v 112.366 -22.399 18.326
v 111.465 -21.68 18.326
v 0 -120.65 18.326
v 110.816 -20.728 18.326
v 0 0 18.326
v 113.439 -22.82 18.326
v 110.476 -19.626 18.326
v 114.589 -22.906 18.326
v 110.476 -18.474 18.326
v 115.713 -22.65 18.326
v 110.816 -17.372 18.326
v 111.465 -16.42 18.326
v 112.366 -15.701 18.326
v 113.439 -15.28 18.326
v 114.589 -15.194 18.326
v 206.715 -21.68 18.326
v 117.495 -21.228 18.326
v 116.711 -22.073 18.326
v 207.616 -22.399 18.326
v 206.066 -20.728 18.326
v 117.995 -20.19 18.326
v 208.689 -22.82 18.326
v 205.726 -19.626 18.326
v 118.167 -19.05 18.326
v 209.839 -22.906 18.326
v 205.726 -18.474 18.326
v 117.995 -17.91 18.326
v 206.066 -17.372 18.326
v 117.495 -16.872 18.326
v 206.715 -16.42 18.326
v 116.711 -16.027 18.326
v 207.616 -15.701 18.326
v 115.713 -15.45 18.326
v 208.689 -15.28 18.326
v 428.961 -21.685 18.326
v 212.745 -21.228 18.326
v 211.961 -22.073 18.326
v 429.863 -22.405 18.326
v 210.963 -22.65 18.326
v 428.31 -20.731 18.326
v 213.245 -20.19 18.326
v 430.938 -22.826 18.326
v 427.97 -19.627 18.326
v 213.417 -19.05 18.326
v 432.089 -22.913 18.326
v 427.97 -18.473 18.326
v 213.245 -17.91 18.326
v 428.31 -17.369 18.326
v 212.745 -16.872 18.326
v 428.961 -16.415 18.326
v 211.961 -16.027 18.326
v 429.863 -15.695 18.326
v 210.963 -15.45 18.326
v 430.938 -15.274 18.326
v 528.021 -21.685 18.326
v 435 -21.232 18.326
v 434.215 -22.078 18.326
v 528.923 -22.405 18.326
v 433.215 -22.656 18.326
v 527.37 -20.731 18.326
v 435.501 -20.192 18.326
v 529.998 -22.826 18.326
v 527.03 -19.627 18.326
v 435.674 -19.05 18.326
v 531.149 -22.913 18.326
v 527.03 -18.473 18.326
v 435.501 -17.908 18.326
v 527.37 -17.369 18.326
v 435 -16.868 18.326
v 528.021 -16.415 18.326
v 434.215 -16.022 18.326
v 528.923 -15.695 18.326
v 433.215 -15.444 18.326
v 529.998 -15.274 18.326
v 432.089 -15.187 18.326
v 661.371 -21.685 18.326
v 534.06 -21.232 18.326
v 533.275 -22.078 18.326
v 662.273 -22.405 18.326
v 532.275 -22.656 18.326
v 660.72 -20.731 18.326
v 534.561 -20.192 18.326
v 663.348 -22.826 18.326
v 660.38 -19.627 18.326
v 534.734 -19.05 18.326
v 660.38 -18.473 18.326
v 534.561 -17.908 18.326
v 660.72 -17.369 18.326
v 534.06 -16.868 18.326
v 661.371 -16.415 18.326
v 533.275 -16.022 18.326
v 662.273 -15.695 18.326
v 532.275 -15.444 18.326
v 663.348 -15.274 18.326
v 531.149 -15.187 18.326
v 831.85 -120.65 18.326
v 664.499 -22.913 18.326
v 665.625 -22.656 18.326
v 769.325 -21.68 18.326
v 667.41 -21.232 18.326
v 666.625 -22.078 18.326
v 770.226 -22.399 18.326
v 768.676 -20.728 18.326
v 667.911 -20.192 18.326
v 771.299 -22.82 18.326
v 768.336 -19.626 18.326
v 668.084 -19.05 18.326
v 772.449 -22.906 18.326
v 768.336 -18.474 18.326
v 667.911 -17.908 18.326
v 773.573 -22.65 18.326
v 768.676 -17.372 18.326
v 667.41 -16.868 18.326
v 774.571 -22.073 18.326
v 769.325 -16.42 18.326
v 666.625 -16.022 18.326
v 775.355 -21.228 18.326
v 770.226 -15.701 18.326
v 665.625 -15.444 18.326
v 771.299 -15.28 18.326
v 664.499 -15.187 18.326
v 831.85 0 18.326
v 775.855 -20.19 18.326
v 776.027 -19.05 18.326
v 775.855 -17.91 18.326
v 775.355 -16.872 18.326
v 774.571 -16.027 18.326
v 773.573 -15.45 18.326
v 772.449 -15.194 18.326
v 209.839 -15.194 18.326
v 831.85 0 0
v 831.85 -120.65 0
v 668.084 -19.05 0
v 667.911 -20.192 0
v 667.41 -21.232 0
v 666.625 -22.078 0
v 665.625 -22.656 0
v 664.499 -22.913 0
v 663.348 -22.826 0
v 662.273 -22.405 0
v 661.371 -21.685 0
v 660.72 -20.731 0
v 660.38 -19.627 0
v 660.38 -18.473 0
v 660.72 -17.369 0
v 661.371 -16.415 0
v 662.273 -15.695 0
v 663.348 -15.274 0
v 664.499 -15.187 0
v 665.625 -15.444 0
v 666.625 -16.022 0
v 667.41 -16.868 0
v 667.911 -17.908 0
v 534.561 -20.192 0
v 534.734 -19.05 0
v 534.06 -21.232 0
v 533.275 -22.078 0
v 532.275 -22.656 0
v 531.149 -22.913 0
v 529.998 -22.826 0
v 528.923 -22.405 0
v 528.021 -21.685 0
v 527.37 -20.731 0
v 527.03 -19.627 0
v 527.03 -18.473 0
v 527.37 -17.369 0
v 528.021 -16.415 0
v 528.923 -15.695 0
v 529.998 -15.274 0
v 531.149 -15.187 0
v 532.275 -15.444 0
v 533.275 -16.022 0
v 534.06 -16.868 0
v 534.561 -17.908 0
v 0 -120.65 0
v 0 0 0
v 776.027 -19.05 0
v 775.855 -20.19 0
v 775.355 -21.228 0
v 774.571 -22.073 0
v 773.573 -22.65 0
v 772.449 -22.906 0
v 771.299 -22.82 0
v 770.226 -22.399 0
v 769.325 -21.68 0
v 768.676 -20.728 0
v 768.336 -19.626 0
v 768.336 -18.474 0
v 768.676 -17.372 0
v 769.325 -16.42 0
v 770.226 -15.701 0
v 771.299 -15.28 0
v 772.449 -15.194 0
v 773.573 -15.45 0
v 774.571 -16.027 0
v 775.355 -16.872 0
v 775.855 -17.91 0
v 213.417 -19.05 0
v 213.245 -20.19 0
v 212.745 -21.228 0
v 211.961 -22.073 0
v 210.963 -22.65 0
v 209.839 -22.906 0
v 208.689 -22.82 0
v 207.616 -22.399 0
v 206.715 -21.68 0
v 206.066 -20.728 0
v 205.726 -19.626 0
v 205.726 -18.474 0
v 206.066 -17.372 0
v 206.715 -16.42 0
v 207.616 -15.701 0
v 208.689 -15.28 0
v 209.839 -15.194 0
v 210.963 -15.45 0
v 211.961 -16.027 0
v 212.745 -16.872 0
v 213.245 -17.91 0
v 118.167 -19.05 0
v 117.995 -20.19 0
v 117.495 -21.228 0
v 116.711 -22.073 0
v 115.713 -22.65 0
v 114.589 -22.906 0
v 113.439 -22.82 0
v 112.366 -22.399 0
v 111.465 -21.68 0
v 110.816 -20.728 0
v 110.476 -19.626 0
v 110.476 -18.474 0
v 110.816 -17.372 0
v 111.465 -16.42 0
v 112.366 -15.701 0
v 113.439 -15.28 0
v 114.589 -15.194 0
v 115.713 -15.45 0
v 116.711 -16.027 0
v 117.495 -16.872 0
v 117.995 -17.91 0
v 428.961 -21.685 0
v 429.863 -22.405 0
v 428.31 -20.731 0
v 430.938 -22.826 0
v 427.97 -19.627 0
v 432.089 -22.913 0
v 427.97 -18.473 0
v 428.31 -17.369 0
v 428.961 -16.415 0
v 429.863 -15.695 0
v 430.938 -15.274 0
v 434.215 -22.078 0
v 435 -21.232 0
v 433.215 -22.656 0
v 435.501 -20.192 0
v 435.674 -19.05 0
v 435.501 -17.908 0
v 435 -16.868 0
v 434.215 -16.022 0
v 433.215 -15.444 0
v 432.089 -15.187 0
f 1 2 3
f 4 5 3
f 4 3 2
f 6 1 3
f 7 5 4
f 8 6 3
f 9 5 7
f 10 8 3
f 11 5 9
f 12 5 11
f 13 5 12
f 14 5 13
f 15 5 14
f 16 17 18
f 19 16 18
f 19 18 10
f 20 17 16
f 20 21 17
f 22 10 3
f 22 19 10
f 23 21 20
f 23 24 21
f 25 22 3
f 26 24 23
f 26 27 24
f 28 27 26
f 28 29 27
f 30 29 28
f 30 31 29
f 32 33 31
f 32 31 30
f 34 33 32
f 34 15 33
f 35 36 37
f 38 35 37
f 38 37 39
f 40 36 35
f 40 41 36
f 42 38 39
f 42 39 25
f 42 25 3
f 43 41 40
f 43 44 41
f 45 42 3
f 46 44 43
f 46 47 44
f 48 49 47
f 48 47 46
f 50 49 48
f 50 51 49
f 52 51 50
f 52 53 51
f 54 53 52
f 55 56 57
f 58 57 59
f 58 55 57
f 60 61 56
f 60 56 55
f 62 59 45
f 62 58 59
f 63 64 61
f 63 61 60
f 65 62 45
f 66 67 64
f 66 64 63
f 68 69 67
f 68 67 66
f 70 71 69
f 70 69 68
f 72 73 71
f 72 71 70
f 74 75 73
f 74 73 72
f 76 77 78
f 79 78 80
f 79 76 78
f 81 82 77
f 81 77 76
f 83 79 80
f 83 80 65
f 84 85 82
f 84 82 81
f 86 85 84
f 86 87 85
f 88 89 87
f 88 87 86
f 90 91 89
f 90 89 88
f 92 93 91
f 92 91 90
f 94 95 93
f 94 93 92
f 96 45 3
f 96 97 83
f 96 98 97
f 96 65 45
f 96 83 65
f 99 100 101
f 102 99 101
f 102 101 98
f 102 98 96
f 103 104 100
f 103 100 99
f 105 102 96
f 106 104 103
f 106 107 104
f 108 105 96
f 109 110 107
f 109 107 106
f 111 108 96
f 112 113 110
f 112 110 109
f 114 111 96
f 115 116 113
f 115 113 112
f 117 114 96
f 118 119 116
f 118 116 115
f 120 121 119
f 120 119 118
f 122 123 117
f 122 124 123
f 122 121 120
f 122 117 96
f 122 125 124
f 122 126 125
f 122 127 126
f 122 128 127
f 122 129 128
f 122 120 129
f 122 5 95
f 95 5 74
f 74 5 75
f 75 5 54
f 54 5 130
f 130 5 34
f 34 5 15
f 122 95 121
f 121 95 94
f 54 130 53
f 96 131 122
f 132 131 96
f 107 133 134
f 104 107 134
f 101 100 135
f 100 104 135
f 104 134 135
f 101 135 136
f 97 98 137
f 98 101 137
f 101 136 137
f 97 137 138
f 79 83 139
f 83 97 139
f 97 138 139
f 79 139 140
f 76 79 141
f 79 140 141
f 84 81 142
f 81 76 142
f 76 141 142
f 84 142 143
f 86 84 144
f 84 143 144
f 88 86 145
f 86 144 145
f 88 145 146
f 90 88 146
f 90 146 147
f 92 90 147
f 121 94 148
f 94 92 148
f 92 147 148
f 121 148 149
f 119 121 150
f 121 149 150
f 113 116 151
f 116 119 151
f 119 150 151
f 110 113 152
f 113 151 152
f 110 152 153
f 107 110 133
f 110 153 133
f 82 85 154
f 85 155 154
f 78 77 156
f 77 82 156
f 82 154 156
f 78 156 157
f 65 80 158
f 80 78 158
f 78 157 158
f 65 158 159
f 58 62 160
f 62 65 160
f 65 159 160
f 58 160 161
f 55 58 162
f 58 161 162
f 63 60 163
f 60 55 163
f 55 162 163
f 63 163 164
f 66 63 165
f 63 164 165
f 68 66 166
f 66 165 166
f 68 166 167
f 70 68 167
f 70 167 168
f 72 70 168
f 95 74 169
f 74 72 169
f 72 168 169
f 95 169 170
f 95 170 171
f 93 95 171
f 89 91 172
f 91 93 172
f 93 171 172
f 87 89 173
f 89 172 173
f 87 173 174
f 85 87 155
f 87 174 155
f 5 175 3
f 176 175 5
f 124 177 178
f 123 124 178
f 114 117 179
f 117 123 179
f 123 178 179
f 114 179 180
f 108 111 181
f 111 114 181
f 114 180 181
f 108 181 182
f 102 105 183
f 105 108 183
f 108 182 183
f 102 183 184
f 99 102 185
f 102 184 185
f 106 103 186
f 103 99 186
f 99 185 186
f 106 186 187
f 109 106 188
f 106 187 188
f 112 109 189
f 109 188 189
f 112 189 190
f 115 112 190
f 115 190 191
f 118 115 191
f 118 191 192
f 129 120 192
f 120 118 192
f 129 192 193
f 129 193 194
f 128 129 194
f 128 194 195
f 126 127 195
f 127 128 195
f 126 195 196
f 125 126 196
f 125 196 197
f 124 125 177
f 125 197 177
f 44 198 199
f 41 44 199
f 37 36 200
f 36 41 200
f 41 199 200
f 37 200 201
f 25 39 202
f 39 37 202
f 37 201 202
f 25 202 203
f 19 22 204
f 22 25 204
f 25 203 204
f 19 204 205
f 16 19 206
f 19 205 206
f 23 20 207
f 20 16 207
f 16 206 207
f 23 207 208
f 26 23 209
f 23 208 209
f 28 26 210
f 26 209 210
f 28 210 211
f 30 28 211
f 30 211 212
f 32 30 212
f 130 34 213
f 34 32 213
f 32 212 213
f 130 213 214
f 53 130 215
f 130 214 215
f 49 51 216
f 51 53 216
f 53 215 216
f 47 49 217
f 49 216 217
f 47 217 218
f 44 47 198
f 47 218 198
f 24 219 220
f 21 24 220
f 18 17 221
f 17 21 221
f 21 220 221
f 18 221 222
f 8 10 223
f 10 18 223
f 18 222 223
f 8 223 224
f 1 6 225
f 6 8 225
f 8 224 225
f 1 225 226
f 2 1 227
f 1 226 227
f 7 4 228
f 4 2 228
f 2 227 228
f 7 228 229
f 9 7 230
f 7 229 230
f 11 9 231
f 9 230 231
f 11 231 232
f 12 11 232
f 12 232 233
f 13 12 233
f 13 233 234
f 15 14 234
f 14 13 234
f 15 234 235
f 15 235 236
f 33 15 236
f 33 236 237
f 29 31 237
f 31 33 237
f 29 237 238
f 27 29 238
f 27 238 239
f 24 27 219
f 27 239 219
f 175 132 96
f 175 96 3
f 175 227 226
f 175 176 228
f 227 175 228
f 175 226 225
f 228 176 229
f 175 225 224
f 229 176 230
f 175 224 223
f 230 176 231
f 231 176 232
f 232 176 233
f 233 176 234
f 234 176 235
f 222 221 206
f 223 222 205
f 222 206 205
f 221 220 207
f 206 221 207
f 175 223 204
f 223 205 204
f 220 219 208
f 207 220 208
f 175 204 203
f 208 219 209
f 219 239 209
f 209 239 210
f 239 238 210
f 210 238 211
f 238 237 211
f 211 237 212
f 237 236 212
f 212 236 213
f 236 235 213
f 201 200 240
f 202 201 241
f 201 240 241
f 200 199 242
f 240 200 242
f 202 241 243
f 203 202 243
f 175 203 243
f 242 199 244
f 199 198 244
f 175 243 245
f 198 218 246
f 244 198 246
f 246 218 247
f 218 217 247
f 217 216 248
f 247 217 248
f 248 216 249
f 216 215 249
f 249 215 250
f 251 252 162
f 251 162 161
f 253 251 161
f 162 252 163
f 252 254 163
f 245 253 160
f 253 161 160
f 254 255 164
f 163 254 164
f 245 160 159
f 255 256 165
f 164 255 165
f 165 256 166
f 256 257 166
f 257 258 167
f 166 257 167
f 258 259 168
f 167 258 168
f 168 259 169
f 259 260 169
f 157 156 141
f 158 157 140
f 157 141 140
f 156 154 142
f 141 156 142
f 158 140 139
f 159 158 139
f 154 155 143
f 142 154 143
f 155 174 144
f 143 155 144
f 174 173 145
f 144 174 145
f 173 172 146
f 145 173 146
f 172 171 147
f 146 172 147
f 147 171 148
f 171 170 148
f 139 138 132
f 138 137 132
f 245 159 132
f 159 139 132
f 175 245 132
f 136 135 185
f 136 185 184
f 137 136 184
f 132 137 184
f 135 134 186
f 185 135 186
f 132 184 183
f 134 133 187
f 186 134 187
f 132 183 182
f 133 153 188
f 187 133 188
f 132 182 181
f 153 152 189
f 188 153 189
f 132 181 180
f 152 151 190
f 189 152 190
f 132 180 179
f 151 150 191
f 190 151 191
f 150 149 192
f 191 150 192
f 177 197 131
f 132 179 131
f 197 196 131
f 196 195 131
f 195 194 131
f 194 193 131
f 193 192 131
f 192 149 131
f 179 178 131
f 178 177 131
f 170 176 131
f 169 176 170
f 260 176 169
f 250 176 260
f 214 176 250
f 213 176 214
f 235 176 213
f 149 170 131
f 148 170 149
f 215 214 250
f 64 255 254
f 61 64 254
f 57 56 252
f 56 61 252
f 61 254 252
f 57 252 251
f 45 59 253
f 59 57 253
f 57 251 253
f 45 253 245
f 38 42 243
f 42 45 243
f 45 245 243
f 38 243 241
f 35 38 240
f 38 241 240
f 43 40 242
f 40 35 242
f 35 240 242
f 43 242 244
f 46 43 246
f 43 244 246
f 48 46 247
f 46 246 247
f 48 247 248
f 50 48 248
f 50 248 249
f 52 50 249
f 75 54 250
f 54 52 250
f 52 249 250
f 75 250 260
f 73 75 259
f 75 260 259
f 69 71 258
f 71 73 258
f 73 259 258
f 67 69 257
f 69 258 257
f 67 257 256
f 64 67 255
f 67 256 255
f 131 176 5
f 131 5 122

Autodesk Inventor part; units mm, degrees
ref_plane "YZ Plane" through (0, 0, 0) normal (1, 0, 0) x (0, 1, 0)
ref_plane "XZ Plane" through (0, 0, 0) normal (0, 1, 0) x (-1, 0, 0)
ref_plane "XY Plane" through (0, 0, 0) normal (0, 0, 1) x (1, 0, 0)
sketch "Sketch1" plane through (0, 0, 0) normal (0, 0, 1) x (1, 0, 0)
  line L0 (0, 0) -> (831.85, 0)
  line L1 (831.85, 0) -> (831.85, -120.65)
  line L2 (831.85, -120.65) -> (0, -120.65)
  line L3 (0, -120.65) -> (0, 0)
  circle A0 centre (114.3, -19.05) radius 3.8671
  circle A1 centre (209.55, -19.05) radius 3.8671
  circle A2 centre (431.8, -19.05) radius 3.8735
  circle A3 centre (530.86, -19.05) radius 3.8735
  circle A4 centre (664.21, -19.05) radius 3.8735
  circle A5 centre (772.16, -19.05) radius 3.8671
  dimension "d0" = 831.85
  dimension "d1" = 120.65
  dimension "d2" = 101.6
  dimension "d3" = 7.7343
  dimension "d4" = 114.3
  dimension "d5" = 7.7343
  dimension "d6" = 95.25
  dimension "d7" = 7.747
  dimension "d9" = 101.6
  dimension "d10" = 222.25
  dimension "d11" = 7.747
  dimension "d12" = 101.6
  dimension "d13" = 99.06
  dimension "d14" = 7.747
  dimension "d15" = 101.6
  dimension "d16" = 133.35
  dimension "d17" = 7.7343
  dimension "d18" = 107.95
extrude "Extrusion1" add sketch "Sketch1" along normal blind 18.3261
properties part number "Kermit bumper (midlde 3)"
